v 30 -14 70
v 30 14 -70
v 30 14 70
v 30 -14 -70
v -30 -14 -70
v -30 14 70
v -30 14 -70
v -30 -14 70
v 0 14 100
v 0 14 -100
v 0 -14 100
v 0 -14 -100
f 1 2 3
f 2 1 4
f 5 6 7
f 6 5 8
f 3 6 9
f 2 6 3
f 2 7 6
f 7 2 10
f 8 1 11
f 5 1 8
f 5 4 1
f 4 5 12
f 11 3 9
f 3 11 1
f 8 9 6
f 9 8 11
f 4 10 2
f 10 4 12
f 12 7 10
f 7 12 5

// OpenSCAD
module chamfered_cube(width=60, height=200, depth=28, chamfer=20){
    difference(){
        translate(v=[0,0,0]) cube(size = [width, depth, height], center = true);
        // Nice edges
        translate(v=[+width/2,0,+height/2]) rotate([0,-45,0])cube(size = [2*chamfer, 2*depth, 2*chamfer], center = true);
        translate(v=[-width/2,0,+height/2]) rotate([0,45,0]) cube(size = [2*chamfer, 2*depth, 2*chamfer], center = true);
        translate(v=[+width/2,0,-height/2]) rotate([0,-45,0])cube(size = [2*chamfer, 2*depth, 2*chamfer], center = true);
        translate(v=[-width/2,0,-height/2]) rotate([0,45,0]) cube(size = [2*chamfer, 2*depth, 2*chamfer], center = true);
    }

}

width=60; 
height=200;
depth=28;
chamfer=width/2/sqrt(2);
chamfered_cube(width=width, height=height, depth=depth, chamfer=chamfer);
